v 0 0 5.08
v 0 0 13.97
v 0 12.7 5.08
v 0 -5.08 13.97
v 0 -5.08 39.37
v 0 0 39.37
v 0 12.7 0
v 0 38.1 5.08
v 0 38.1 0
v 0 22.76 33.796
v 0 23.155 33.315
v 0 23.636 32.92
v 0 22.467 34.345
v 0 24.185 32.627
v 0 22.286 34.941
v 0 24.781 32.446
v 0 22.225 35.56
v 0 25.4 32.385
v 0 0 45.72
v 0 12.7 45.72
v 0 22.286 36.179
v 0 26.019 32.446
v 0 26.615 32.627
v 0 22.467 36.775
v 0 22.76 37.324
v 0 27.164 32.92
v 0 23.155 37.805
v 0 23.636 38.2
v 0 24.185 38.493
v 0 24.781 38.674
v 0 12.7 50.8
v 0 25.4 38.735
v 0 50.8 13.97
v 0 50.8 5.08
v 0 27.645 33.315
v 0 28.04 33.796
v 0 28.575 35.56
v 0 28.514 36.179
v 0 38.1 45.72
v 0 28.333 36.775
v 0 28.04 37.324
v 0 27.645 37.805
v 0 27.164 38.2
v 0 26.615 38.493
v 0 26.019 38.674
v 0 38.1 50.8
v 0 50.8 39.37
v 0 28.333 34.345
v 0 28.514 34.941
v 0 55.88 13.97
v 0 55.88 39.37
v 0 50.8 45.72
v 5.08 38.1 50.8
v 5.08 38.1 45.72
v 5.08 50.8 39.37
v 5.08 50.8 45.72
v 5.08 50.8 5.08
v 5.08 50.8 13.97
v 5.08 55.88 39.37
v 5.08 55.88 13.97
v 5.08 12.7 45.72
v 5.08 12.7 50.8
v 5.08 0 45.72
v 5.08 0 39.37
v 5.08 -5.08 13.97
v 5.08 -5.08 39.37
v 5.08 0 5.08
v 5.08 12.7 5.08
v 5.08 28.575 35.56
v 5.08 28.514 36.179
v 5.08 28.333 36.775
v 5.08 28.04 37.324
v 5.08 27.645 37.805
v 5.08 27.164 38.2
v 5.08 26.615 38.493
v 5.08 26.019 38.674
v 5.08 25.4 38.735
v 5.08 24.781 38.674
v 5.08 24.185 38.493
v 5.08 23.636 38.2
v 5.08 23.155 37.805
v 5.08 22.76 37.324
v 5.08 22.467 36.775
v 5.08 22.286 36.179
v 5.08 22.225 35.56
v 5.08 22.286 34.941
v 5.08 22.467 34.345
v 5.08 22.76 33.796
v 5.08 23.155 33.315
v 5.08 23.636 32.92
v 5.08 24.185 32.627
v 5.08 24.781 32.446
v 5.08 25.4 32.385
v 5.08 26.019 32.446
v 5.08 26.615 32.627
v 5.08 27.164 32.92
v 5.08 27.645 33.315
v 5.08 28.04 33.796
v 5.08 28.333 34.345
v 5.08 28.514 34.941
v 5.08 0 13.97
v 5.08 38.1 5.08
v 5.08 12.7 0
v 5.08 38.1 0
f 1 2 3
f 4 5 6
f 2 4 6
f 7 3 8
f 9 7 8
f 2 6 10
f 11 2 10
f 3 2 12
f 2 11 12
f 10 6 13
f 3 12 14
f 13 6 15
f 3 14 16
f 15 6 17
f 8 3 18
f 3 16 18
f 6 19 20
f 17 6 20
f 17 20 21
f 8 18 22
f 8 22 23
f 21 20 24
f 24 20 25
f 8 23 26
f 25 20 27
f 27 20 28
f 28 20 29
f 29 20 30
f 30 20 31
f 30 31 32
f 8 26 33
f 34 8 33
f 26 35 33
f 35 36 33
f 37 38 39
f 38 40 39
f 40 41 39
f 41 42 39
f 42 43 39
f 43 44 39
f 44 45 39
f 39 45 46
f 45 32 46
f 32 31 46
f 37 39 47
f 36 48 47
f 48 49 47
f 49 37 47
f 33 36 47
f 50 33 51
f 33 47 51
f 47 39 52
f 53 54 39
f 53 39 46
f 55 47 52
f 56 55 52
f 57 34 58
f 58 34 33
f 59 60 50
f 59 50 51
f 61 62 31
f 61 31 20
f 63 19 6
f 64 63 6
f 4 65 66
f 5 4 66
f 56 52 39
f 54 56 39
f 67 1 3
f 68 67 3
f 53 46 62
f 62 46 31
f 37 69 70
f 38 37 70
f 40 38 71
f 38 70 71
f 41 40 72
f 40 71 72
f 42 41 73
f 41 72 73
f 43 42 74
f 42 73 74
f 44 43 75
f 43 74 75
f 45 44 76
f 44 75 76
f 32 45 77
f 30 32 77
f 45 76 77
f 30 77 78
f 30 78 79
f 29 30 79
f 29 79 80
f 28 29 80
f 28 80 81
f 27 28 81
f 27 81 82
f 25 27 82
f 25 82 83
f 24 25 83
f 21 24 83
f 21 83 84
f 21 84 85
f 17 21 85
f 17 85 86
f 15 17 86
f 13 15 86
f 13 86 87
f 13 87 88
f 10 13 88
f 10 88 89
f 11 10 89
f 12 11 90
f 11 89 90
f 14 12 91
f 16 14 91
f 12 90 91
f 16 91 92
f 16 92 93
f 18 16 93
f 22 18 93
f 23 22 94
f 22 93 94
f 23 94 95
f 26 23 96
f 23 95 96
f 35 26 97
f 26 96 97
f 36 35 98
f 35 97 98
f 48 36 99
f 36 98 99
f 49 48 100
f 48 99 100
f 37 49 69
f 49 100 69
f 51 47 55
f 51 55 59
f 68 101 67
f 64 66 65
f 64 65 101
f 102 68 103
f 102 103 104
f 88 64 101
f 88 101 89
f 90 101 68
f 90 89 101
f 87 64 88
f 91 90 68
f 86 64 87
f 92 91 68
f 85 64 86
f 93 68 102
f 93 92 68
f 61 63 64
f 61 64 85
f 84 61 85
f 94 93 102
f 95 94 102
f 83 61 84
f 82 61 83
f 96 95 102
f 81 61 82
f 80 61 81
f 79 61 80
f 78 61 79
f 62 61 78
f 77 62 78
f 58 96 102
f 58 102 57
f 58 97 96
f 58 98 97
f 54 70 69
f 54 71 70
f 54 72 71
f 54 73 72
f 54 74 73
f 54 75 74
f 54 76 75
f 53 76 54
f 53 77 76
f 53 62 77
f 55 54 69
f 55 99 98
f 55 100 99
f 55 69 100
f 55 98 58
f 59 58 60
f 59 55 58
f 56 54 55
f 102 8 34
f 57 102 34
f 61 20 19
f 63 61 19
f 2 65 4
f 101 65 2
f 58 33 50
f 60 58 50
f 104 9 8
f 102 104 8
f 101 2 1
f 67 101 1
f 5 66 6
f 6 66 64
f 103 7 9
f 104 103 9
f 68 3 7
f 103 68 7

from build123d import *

# Parameters (mm, degrees)
F1_DEPTH = 5.08
F2_R     = 3.175
F3_DEPTH = 25.4
F4_W     = 5.08
F4_H     = 25.4
F5_DEPTH = 5.08


with BuildPart() as f1:
    # F0 (on Right) → F1 (new body)
    with BuildSketch(Plane.YZ):
        Polygon((12.7, 5.08), (12.7, 0), (38.1, 0), (38.1, 5.08), (50.8, 5.08), (50.8, 45.72), (38.1, 45.72), (38.1, 50.8), (12.7, 50.8), (12.7, 45.72), (0, 45.72), (0, 5.08), align=None)
    extrude(amount=F1_DEPTH)

    # F2 (on face) → F3 (cut)
    with BuildSketch(Plane.YZ.offset(5.08)):
        with Locations((25.4, 35.56)):
            Circle(F2_R)
    extrude(amount=-F3_DEPTH, mode=Mode.SUBTRACT)

    # F4 (on face) → F5 (join)
    with BuildSketch(Plane.YZ.offset(5.08)):
        with Locations((-2.54, 26.67)):
            Rectangle(F4_W, F4_H)
        with Locations((53.34, 26.67)):
            Rectangle(F4_W, F4_H)
    extrude(amount=-F5_DEPTH)


solid = f1.part
